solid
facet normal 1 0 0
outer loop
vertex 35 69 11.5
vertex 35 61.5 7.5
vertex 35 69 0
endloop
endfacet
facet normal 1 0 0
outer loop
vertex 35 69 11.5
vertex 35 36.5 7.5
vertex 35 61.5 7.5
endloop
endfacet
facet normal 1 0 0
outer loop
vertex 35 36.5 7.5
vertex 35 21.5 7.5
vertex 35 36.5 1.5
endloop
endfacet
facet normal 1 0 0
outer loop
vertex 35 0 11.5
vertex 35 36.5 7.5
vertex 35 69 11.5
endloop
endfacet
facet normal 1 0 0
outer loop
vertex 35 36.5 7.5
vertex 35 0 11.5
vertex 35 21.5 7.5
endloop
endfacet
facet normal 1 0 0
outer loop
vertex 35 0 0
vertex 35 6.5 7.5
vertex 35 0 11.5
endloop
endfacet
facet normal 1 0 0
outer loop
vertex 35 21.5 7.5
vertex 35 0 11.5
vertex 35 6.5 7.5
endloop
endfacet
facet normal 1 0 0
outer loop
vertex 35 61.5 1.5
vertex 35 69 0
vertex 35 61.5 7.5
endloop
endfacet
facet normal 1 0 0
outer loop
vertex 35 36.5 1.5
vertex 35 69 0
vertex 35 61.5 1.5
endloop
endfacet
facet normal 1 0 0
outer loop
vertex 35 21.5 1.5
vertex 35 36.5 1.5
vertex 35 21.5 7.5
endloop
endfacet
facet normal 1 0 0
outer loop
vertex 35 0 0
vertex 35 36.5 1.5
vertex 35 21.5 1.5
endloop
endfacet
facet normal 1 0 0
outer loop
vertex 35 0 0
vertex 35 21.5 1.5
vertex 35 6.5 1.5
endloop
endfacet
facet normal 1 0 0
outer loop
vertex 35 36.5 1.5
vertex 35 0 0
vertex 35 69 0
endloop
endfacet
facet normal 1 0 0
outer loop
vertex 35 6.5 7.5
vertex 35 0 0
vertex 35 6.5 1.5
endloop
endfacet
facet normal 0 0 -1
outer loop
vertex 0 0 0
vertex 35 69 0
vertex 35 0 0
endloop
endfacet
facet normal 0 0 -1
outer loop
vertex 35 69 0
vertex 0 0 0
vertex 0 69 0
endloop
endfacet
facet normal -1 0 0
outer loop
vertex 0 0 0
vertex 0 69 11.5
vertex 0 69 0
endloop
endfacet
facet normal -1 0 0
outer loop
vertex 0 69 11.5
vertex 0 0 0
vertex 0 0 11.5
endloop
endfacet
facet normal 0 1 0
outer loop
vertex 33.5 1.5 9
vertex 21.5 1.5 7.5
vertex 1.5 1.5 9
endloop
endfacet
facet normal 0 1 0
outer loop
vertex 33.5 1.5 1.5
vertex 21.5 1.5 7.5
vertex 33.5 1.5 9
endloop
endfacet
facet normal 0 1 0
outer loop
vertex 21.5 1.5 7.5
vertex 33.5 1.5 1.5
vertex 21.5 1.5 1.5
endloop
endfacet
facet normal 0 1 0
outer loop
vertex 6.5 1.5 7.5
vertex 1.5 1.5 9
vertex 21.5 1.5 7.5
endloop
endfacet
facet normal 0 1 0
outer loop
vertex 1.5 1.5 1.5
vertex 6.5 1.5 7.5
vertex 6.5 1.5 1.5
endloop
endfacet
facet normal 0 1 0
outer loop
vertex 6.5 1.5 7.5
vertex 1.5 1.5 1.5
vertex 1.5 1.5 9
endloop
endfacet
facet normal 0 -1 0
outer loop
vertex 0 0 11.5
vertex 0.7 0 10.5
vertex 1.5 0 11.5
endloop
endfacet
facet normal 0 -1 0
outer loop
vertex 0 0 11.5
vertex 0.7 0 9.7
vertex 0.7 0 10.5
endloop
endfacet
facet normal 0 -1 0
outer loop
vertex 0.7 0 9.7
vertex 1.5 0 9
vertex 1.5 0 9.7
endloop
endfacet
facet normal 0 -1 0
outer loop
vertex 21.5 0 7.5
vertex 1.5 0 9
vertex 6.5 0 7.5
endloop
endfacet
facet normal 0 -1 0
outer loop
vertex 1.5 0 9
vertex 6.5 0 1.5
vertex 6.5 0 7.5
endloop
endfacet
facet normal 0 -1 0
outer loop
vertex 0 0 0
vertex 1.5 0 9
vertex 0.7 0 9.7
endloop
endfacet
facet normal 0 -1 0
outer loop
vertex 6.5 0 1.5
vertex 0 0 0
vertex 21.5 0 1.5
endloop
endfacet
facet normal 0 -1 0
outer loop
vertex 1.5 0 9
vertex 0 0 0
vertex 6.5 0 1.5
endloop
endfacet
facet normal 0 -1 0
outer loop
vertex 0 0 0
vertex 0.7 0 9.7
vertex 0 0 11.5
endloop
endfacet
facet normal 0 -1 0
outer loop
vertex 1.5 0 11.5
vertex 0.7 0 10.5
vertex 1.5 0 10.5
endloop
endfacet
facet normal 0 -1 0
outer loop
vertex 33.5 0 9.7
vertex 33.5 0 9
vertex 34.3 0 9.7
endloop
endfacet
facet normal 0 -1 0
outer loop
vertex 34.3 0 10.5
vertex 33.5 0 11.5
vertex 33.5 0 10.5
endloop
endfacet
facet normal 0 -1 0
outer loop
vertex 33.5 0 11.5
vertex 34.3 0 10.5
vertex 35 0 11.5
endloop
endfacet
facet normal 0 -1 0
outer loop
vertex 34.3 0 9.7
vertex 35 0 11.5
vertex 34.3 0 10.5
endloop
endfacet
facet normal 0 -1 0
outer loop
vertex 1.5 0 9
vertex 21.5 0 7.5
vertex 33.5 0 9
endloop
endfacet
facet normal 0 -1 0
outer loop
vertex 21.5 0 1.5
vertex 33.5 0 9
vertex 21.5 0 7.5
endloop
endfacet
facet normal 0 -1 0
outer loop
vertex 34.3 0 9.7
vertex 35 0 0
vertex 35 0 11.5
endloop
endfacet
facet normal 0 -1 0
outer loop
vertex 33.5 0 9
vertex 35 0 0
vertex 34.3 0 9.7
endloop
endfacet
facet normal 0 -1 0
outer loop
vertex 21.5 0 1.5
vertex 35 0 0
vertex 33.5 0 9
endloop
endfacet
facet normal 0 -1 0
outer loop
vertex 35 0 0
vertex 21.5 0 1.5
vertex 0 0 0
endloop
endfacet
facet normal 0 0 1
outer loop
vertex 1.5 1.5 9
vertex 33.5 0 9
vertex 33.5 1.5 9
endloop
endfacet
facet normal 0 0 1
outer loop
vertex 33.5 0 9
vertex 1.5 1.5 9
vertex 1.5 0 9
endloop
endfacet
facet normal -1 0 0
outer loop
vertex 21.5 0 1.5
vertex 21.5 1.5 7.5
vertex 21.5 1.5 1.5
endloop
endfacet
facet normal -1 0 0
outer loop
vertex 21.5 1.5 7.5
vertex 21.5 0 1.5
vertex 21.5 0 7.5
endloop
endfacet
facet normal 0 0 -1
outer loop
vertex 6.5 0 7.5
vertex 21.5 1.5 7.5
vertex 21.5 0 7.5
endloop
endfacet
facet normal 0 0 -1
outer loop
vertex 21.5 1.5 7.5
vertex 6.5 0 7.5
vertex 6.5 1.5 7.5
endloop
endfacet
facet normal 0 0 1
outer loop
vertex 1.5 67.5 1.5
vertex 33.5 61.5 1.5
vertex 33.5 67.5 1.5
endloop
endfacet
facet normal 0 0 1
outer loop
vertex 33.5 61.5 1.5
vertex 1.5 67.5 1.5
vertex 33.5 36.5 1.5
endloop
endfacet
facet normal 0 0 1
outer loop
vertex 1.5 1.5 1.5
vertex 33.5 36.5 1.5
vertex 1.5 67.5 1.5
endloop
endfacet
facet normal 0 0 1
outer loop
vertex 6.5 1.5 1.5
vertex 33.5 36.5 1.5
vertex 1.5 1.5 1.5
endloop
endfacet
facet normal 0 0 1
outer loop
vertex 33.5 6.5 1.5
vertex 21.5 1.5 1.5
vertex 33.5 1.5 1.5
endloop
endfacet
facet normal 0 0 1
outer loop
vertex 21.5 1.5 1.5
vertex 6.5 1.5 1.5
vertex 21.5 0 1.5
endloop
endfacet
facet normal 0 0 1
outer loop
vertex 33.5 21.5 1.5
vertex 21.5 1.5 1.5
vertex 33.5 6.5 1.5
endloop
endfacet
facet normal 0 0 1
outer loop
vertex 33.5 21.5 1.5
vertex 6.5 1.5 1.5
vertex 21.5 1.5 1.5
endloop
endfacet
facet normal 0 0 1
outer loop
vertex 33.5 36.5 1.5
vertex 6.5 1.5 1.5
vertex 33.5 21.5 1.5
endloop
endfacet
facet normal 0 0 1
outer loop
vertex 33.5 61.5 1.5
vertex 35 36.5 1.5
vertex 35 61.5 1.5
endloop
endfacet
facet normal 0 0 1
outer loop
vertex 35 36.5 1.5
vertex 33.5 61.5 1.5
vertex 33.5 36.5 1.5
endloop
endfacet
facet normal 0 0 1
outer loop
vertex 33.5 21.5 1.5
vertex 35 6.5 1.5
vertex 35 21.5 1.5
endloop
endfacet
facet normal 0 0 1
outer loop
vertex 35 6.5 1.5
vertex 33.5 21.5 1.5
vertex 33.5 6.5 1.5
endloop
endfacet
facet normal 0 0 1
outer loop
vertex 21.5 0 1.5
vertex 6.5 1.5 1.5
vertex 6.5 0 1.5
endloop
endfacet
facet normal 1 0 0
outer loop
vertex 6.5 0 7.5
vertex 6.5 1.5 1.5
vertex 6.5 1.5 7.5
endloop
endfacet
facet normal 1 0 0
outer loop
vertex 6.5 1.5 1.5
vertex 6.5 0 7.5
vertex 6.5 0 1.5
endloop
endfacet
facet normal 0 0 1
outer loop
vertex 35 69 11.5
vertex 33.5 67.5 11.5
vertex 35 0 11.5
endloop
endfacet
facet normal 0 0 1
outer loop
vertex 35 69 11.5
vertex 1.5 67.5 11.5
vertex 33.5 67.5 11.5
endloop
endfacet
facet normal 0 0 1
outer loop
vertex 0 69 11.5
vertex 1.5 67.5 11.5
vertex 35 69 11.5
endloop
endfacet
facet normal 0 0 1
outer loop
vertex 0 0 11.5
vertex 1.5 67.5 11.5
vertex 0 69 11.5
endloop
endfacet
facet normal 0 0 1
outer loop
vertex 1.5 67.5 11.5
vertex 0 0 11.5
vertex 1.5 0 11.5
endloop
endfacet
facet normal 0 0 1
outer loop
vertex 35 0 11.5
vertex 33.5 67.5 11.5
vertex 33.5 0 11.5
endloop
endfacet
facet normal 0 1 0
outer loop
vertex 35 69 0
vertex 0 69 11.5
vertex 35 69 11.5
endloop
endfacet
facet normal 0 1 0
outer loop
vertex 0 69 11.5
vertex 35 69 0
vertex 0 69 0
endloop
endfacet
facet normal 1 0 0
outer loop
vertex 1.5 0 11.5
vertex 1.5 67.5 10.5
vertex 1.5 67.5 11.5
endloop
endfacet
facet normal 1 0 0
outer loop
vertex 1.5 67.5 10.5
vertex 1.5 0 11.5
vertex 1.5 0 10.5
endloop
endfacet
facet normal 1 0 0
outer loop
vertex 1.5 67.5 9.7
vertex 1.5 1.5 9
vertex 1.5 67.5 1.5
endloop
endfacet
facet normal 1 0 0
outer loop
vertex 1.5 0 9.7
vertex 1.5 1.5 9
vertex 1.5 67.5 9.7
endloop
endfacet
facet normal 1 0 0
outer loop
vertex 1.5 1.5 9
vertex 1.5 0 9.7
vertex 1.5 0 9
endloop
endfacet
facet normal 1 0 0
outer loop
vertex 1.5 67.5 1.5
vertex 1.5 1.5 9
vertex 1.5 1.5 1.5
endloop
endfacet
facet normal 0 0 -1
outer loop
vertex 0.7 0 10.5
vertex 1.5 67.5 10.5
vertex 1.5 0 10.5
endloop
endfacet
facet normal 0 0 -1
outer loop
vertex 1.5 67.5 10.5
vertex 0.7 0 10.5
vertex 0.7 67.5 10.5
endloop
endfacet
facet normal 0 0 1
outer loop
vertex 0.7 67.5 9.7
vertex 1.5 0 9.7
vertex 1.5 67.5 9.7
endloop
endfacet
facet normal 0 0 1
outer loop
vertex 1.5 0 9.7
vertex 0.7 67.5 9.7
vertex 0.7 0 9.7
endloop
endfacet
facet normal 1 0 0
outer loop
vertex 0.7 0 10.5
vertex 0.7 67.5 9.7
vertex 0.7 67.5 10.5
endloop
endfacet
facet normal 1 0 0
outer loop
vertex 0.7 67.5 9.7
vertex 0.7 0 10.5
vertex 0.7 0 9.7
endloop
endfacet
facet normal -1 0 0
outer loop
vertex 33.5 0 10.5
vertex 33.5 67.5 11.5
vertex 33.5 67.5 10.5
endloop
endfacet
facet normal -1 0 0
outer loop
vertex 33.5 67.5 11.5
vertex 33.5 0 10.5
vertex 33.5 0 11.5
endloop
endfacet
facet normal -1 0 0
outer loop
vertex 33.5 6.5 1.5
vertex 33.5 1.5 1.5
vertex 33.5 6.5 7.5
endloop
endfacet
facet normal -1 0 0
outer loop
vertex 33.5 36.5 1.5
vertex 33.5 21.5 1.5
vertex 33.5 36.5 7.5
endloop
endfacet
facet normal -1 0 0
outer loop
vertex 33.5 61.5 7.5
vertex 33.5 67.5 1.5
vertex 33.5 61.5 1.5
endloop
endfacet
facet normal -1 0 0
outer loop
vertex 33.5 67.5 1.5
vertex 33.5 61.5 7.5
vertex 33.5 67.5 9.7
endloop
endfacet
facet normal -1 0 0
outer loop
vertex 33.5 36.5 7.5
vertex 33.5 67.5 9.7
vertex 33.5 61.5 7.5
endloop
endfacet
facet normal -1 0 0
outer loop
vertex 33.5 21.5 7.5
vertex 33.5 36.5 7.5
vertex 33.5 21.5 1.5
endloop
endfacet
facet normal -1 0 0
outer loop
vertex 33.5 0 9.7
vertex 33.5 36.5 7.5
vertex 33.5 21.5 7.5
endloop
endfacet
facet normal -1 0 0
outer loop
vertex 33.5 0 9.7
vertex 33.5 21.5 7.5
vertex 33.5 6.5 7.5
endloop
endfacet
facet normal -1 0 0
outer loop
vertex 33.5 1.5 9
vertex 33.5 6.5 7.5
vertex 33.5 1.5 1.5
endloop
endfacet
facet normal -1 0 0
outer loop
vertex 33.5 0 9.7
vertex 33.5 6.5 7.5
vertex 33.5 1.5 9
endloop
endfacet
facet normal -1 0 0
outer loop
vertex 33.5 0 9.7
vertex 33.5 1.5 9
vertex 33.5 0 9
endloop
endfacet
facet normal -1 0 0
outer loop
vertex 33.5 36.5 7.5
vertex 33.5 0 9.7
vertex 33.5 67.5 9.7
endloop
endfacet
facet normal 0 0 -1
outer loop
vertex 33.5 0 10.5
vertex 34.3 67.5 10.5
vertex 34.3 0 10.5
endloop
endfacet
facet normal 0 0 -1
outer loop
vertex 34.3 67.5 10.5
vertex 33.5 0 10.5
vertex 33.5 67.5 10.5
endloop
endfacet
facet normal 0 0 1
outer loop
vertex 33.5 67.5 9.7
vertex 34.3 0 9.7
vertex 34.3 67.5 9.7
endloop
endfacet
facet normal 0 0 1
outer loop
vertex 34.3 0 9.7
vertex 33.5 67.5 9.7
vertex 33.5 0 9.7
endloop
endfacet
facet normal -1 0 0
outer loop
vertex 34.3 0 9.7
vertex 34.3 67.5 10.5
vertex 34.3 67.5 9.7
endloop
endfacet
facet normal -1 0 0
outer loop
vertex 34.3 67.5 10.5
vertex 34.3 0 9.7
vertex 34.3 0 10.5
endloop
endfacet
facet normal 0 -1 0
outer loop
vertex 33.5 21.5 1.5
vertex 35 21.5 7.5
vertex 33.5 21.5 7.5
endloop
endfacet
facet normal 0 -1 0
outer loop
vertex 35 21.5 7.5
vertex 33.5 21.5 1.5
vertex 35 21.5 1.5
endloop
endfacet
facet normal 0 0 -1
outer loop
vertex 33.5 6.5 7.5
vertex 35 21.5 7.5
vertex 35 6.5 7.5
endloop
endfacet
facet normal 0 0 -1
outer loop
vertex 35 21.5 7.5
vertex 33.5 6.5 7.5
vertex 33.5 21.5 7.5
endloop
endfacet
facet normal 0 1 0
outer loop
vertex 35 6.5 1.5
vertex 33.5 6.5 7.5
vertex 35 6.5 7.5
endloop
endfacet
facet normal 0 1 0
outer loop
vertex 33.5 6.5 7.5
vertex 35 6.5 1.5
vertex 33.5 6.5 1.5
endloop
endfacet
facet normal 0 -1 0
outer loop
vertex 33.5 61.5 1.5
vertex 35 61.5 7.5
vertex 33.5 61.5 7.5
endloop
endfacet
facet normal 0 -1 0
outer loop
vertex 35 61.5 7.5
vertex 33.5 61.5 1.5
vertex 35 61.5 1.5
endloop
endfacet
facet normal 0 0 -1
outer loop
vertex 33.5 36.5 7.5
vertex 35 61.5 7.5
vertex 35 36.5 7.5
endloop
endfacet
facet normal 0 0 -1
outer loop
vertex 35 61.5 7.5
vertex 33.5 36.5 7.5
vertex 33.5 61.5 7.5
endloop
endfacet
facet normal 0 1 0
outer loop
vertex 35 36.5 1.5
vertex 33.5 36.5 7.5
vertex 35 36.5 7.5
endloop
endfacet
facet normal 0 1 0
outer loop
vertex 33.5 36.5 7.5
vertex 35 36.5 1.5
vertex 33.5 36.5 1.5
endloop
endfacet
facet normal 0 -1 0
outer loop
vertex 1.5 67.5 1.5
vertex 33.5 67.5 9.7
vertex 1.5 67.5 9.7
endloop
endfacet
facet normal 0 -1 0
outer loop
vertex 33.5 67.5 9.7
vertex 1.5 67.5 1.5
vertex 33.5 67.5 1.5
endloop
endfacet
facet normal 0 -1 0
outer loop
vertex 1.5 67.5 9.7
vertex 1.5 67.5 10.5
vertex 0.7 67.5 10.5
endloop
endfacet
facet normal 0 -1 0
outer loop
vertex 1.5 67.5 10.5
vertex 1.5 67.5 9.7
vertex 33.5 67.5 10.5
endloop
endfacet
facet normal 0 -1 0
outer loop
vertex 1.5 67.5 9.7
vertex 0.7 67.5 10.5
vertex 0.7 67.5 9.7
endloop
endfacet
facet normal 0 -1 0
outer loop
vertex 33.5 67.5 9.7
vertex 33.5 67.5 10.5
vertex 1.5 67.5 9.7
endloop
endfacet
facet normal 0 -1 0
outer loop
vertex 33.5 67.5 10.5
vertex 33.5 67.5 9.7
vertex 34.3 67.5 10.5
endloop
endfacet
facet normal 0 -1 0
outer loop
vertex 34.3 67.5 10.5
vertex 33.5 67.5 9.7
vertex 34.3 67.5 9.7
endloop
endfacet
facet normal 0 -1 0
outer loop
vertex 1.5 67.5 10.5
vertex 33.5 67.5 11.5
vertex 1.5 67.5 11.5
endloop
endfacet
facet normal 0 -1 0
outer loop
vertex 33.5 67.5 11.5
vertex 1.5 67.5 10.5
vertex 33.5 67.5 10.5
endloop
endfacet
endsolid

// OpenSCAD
l=66;
w=32;
h=10;
t=1.5;

slot=0.8;
trim=2.5;

module cutout(x,z,len,height)
{
    translate([x+t,-t,z+t]){
        cube([len,3*t,height]);
    }
}

// Bottom
cube([w+2*t,l+2*t,t]);


// Front
translate([0,0,0]){
    rotate([0,0,0]){ 
        difference(){
           cube([w+2*t,t,h+t]);
            
           translate([0,-t,h+t-trim]){
               cube([w*2*t,3*t,trim]);
           }
           cutout(5,0,15,6);
        }
    }
}

// Back
translate([w+2*t,l+2*t,0]){
    rotate([0,0,180]){
        difference(){
           cube([w+2*t,t,h+t]);
            
            //cutout(0,0,2,2);
        }
    }
}

// Left
translate([0,l+2*t,0]){
    rotate([0,0,-90]){ 
        difference() {
           cube([l+2*t,t,h+t]);
           translate([0,t-slot,h+t-slot-1]){
               cube([l+2*t,slot+.2,slot]);
           }
            //cutout(40,0,25,6);
        }
    }
}

// Right
translate([w+2*t,0,0]){
    rotate([0,0,90]){
        difference(){ 
           cube([l+2*t,t,h+t]);
            
            translate([0,t-slot,h+t-slot-1]){
               cube([l+2*t,slot+0.2,slot]);
           }
            cutout(5,0,15,6);
            cutout(35,0,25,6);
            
        }
    }
}
